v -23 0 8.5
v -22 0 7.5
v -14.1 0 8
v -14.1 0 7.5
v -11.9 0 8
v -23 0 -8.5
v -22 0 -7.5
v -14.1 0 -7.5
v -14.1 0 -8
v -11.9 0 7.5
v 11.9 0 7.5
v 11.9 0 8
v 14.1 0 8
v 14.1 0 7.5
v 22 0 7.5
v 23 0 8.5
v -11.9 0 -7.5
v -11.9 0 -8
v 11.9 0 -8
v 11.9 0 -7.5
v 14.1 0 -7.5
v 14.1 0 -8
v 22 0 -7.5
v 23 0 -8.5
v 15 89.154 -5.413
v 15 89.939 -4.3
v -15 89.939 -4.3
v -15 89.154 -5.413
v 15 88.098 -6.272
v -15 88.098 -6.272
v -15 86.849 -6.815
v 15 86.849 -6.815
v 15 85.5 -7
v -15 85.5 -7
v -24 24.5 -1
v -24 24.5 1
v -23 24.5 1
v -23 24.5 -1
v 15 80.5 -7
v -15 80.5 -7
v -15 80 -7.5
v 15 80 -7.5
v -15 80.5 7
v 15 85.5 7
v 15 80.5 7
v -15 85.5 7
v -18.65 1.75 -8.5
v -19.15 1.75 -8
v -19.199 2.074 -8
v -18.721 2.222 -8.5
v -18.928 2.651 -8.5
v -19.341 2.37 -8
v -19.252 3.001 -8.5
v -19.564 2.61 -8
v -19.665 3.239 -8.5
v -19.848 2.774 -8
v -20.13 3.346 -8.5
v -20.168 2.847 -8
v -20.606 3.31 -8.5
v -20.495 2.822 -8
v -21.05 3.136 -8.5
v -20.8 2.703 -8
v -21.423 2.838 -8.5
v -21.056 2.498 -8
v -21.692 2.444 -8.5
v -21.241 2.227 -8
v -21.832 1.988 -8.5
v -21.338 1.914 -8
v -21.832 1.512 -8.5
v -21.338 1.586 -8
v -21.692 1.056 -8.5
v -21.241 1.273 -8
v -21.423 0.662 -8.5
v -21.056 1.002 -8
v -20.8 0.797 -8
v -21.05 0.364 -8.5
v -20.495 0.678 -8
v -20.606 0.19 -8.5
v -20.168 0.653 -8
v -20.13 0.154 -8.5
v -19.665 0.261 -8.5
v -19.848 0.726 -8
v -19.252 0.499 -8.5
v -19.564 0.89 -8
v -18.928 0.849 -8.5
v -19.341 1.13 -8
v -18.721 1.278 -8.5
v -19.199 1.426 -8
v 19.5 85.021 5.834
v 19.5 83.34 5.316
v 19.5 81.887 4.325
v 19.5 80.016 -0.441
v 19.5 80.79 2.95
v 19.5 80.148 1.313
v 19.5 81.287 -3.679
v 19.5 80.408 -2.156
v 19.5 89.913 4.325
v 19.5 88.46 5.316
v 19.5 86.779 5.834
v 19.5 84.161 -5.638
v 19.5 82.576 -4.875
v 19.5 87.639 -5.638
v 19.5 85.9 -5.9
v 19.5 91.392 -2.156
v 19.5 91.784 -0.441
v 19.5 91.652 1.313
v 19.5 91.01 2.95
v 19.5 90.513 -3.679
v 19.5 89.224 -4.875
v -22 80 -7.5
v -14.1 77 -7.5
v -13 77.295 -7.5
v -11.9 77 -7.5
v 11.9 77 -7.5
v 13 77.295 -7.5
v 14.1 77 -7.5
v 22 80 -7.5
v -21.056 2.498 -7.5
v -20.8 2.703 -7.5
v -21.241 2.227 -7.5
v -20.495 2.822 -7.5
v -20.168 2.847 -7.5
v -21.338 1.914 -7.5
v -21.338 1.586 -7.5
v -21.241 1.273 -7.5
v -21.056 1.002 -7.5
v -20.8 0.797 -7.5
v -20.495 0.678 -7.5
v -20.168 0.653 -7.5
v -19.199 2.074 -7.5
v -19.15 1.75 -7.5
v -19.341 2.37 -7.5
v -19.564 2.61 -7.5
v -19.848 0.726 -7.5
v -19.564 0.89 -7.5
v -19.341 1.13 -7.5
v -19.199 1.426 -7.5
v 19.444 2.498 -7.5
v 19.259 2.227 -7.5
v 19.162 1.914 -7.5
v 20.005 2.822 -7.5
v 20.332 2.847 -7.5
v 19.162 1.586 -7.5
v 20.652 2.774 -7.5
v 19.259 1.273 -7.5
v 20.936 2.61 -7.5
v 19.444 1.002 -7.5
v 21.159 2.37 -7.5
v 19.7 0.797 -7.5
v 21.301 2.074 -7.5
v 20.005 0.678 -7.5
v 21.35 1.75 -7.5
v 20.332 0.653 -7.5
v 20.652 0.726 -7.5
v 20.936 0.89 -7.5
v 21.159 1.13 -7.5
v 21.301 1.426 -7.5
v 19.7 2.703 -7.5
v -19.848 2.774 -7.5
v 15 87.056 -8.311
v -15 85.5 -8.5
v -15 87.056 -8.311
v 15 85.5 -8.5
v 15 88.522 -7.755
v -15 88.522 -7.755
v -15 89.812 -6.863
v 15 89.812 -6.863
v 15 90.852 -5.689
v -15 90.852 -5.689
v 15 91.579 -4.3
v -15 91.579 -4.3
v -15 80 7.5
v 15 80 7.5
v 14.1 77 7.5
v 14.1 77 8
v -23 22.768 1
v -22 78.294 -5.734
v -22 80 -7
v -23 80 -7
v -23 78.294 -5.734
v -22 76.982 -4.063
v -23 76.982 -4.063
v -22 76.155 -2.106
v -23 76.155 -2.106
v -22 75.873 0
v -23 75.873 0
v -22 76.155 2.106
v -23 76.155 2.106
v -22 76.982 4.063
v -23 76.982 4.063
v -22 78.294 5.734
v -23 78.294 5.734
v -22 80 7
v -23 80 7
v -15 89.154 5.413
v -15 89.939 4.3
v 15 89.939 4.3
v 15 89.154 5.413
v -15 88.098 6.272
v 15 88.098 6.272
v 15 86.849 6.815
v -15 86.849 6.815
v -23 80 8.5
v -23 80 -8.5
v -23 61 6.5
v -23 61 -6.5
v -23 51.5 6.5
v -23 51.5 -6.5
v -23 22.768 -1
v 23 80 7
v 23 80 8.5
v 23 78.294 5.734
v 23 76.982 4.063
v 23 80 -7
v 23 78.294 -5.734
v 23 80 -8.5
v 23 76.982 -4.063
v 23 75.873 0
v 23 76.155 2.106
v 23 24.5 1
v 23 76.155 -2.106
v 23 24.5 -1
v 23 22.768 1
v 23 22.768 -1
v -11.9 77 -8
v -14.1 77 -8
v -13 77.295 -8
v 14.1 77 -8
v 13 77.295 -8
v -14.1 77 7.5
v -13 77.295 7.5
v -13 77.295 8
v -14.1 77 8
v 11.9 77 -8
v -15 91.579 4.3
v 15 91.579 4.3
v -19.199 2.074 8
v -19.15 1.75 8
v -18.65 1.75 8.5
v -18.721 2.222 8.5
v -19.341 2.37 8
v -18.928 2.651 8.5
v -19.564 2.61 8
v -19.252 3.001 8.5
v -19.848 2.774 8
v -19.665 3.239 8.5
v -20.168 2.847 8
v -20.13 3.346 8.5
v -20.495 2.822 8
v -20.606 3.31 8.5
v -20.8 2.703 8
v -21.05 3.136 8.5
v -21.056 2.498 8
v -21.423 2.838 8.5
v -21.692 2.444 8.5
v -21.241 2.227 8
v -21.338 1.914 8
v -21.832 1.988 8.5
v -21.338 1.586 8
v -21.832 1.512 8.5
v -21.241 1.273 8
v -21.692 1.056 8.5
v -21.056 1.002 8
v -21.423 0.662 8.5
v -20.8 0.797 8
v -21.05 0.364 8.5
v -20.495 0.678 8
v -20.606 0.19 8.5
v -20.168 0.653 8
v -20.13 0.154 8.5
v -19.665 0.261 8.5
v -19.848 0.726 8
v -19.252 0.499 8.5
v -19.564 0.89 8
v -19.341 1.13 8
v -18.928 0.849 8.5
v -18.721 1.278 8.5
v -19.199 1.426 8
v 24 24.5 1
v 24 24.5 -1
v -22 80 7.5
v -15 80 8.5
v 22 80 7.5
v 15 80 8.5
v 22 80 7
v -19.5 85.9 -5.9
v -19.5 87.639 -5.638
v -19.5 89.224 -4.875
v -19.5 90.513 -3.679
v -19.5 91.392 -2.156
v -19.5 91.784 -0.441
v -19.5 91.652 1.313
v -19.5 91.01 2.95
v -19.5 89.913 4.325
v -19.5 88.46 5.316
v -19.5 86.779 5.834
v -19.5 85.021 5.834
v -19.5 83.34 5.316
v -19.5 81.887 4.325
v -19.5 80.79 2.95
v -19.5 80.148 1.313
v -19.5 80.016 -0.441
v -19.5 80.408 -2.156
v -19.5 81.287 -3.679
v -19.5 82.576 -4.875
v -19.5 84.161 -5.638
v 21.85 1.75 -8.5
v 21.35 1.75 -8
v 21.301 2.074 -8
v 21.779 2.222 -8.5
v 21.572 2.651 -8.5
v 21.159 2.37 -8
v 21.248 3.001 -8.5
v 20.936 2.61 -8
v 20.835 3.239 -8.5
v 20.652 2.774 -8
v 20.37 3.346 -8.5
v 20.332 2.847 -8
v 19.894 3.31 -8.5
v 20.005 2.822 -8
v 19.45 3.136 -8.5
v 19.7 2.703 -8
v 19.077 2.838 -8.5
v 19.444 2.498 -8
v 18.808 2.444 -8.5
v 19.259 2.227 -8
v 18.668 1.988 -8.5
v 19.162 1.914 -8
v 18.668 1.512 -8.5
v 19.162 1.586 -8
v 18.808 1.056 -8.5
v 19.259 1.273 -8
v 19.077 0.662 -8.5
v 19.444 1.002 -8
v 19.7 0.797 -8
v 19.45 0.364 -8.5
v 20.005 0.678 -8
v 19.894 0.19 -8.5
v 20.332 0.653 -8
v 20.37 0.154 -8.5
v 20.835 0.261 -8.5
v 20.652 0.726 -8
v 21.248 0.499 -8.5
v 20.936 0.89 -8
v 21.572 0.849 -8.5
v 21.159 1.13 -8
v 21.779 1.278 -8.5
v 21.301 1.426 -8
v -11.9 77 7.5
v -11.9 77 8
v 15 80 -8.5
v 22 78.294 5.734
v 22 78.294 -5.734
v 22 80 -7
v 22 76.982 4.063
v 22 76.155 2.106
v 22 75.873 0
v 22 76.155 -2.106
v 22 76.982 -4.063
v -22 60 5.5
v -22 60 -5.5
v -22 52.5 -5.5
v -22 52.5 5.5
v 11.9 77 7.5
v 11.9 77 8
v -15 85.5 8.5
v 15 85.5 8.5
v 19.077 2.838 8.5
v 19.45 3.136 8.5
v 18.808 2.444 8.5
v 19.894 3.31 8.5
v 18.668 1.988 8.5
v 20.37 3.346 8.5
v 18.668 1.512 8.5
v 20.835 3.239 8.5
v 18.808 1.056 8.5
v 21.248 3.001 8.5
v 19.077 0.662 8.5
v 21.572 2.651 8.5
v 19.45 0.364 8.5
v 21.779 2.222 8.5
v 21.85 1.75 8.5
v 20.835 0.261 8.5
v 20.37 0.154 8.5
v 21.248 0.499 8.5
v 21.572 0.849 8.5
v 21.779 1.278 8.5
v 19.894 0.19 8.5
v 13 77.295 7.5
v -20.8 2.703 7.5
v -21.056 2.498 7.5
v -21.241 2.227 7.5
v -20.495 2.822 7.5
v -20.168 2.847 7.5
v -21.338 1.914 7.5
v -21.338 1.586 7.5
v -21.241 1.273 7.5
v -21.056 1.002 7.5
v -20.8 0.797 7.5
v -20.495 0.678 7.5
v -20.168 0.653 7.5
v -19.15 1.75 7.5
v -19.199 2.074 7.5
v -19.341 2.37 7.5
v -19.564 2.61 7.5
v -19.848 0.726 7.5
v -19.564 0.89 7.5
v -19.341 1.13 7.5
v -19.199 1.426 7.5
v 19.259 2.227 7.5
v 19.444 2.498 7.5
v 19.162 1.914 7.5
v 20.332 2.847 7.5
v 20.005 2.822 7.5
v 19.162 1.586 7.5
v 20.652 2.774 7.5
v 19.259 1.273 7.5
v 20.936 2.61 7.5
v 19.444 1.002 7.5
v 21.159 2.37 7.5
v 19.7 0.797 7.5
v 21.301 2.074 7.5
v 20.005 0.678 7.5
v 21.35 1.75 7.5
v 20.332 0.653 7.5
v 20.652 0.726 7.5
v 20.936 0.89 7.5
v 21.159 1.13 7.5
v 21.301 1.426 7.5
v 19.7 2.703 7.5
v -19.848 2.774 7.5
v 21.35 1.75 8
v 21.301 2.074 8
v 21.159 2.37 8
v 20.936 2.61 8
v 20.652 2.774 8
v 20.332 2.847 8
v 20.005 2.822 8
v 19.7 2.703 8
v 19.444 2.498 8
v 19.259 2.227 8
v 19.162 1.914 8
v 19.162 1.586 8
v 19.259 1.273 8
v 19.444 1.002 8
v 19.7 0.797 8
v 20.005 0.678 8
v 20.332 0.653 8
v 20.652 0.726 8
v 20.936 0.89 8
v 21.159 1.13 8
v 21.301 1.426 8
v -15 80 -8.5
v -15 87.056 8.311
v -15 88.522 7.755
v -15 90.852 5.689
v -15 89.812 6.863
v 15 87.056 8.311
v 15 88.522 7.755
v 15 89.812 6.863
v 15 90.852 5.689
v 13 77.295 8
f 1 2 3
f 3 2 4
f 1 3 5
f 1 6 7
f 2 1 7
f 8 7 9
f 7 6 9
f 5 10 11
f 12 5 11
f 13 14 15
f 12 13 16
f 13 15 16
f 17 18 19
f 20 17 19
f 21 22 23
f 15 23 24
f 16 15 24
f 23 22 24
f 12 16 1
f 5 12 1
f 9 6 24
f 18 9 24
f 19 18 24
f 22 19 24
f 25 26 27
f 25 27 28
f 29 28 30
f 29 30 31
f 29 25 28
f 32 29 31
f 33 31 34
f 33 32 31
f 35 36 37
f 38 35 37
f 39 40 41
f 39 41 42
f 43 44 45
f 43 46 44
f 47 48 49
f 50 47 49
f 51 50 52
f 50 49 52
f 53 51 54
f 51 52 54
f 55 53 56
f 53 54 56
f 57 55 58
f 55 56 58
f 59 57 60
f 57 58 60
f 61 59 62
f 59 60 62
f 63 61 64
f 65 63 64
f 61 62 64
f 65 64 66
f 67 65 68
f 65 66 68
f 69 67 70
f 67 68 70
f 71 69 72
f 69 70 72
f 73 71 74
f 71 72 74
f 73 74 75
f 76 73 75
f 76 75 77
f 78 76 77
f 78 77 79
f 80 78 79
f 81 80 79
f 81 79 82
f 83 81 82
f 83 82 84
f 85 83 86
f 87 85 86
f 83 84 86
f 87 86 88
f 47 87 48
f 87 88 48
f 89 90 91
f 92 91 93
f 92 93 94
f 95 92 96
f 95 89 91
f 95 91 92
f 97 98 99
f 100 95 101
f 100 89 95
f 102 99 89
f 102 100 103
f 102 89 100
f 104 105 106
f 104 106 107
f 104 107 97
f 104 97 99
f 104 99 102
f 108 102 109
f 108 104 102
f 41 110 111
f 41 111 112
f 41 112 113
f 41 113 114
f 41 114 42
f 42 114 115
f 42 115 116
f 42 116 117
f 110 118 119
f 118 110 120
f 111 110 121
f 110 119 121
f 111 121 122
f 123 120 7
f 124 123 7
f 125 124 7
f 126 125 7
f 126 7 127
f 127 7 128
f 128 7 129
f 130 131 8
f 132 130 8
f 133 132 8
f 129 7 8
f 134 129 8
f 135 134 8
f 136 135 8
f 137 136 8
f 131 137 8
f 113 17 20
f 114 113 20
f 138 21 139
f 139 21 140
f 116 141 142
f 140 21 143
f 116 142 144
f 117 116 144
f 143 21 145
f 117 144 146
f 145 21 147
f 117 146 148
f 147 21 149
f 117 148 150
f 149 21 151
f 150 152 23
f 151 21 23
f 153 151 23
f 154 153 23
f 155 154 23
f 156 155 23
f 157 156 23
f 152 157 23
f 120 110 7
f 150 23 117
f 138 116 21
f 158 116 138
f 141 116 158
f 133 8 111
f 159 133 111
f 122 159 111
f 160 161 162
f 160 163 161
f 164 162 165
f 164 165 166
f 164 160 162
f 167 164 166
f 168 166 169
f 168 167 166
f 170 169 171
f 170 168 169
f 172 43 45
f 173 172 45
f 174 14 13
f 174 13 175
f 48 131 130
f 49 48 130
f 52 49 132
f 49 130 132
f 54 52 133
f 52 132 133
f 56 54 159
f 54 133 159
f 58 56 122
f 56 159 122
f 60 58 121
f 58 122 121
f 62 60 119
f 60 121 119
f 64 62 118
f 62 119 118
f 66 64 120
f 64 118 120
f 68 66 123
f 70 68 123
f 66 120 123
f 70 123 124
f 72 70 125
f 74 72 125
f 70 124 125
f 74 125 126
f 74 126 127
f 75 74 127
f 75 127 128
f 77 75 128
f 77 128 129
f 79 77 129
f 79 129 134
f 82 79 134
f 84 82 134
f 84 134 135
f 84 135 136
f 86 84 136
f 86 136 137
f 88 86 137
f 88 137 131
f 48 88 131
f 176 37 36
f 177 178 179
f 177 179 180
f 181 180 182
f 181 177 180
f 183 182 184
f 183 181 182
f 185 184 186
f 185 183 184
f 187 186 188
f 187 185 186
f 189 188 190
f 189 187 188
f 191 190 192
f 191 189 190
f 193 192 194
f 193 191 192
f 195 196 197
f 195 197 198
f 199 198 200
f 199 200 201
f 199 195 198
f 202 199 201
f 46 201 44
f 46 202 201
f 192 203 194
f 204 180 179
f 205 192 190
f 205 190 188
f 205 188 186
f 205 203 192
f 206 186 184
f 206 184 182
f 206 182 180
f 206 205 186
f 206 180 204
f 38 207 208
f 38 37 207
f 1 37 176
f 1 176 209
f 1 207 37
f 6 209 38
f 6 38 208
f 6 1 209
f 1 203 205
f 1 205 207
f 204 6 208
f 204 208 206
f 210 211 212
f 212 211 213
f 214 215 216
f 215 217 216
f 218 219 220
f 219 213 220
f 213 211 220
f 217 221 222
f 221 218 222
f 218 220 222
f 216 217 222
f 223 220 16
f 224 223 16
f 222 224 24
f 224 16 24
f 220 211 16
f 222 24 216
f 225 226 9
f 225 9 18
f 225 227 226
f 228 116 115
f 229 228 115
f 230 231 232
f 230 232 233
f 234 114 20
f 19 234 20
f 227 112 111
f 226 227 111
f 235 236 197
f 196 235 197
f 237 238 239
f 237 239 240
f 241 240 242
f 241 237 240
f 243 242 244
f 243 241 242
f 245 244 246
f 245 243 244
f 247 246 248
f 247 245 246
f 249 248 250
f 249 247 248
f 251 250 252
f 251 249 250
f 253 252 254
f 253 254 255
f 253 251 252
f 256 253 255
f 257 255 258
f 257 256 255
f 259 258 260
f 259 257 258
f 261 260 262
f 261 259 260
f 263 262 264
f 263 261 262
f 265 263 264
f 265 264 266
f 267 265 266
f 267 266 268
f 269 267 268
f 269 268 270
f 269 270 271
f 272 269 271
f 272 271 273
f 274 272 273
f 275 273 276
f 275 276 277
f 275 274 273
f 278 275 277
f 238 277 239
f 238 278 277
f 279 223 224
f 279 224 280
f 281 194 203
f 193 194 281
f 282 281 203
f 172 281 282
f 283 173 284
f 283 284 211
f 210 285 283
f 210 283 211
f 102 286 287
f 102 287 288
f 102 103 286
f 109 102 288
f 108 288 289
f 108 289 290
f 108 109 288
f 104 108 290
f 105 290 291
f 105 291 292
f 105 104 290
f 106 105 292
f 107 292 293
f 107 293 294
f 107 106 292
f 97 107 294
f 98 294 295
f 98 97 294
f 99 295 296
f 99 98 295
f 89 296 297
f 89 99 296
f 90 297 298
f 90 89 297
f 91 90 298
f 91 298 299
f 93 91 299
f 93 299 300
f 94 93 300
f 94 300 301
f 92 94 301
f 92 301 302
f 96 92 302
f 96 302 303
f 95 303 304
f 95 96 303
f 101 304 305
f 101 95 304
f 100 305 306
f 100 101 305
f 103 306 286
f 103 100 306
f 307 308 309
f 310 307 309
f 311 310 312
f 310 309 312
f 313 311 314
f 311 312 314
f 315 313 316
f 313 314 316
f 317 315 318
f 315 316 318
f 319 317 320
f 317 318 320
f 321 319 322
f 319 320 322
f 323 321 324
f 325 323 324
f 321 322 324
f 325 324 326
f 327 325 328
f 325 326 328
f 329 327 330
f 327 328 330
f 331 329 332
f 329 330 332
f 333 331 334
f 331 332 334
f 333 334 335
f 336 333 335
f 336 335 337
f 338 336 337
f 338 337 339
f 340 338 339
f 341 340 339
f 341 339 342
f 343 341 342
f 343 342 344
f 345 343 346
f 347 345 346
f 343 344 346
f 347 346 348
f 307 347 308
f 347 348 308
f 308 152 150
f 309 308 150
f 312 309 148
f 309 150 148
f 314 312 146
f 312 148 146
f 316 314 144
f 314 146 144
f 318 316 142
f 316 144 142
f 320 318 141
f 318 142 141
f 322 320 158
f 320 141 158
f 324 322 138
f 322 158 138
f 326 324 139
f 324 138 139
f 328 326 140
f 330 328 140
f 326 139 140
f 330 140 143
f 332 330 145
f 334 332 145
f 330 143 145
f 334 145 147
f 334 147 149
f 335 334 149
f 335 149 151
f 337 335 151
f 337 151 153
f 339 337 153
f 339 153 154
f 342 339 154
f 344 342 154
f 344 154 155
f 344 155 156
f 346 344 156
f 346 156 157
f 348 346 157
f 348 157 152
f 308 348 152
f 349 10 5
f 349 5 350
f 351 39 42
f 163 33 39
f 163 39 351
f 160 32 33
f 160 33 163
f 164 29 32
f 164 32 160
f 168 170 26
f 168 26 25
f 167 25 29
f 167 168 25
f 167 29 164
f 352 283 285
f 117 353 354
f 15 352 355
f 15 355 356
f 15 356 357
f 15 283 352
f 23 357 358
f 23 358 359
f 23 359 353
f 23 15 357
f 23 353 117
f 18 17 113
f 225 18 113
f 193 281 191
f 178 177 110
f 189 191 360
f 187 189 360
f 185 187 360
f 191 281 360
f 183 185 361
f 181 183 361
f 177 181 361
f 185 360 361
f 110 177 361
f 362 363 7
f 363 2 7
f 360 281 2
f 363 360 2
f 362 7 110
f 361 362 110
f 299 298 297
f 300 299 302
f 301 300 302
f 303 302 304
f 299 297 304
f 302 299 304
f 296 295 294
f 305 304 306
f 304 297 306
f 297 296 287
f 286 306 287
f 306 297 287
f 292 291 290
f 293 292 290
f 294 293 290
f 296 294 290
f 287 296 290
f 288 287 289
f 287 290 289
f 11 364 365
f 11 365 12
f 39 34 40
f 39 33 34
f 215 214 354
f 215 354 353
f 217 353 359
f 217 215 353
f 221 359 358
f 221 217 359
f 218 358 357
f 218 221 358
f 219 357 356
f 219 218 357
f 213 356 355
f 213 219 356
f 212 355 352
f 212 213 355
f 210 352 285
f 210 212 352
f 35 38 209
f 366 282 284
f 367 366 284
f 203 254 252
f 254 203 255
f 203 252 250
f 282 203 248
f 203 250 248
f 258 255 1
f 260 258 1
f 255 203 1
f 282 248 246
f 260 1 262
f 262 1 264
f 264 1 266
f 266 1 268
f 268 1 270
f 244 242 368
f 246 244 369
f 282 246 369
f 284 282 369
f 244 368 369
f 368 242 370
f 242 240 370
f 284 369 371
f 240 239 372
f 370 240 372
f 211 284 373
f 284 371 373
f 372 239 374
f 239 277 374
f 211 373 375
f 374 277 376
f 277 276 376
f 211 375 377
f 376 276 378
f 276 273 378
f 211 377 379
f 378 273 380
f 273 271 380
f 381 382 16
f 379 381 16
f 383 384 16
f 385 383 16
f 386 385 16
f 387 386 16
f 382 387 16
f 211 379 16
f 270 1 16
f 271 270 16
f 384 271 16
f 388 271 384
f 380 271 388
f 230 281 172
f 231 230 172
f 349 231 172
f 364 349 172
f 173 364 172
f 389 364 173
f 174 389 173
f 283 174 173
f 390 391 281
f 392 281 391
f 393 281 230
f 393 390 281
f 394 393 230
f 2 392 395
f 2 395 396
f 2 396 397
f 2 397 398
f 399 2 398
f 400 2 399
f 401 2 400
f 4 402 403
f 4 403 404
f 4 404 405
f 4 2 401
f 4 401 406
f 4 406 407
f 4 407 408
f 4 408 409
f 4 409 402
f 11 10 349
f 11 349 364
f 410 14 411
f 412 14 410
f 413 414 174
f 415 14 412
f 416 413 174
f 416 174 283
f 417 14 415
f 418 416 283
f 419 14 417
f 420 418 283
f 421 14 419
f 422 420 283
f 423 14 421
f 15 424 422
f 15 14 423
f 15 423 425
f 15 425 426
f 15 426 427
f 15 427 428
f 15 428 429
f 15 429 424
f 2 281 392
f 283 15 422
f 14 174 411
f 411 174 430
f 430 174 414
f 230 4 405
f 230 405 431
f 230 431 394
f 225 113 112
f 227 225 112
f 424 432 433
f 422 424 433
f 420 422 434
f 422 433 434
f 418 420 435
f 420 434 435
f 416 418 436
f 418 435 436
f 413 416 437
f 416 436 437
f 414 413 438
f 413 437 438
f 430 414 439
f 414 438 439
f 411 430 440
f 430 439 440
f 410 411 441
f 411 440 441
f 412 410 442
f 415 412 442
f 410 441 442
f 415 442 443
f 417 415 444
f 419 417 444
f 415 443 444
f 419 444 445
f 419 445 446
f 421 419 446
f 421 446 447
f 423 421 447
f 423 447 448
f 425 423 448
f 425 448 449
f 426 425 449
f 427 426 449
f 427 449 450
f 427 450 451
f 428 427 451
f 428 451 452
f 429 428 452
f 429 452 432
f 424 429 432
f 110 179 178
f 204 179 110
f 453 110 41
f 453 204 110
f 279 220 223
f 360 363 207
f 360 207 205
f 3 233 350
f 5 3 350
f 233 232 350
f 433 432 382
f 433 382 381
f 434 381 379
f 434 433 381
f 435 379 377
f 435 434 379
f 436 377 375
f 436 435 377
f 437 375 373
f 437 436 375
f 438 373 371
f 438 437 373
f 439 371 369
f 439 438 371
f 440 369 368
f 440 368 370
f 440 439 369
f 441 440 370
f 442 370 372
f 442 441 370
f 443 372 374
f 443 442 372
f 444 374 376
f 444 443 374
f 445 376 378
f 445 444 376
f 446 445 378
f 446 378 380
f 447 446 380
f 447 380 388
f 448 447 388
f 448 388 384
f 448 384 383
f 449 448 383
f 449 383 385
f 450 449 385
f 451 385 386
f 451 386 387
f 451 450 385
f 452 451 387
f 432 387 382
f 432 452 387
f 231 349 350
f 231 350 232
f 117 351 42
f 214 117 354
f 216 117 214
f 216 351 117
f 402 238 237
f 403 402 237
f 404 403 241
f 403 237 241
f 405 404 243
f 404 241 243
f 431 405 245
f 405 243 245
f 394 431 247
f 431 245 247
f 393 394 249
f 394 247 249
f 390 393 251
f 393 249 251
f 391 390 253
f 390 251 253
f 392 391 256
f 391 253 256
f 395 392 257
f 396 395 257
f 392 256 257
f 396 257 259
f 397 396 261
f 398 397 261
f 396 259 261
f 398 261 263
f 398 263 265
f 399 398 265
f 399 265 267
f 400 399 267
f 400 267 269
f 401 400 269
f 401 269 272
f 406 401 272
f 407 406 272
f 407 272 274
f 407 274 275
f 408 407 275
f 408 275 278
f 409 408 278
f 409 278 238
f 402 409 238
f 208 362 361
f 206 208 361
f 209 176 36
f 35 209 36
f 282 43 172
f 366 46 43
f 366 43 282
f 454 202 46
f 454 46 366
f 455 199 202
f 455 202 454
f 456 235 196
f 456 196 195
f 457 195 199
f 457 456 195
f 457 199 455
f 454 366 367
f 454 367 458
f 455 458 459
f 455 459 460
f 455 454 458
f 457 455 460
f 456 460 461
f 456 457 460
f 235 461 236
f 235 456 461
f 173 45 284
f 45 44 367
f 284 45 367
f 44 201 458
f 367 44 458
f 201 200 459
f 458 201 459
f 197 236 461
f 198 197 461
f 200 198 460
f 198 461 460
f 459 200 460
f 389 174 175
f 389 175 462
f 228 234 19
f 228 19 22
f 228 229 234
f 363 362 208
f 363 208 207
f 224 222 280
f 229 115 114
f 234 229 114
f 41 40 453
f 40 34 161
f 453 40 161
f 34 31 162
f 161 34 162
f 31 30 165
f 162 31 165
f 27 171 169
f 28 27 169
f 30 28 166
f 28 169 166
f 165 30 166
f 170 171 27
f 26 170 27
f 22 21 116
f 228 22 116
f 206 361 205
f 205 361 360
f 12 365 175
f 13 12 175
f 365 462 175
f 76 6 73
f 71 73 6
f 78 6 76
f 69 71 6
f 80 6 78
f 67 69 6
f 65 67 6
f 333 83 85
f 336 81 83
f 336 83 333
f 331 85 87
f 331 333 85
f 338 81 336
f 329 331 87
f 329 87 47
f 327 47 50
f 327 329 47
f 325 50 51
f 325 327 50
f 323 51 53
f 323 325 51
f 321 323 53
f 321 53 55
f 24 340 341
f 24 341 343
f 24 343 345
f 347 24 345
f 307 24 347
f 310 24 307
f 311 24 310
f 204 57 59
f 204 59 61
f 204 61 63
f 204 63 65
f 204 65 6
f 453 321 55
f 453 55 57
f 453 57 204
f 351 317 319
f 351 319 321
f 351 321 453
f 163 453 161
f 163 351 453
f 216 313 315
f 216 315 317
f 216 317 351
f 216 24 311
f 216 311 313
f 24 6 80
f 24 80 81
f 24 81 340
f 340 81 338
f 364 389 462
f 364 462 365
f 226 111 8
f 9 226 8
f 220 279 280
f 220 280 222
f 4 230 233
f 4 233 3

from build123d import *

# Parameters (mm, degrees)
SKETCH_1_W          = 46
SKETCH_1_H          = 17
SKETCH_1_W_2        = 44
SKETCH_1_H_2        = 15
EXTRUDE_1_DEPTH     = 80
SKETCH_4_W          = 11
SKETCH_4_H          = 7.5
CUT_EXTRUDE_1_DEPTH = 30
SKETCH_6_R          = 5.9
EXTRUDE_4_DEPTH     = 19.5
EXTRUDE_3_DEPTH     = 15
CUT_EXTRUDE_2_DEPTH = 60
CUT_EXTRUDE_3_DEPTH = 0.5
CHAMFER_1_SIZE      = 1
EXTRUDE_START       = -7.5
EXTRUDE_7_DEPTH     = 2
CHAMFER_2_SIZE      = 0.5
SKETCH_15_R         = 1.1
CUT_EXTRUDE_5_DEPTH = 40
CHAMFER_3_SIZE      = 0.5


with BuildPart() as part:
    # 草图1 → 凸台-拉伸1 (new body)
    with BuildSketch(Plane(origin=(0, 0, 0), x_dir=(1, 0, 0), z_dir=(0, 1, 0))):
        Rectangle(SKETCH_1_W, SKETCH_1_H)
        Rectangle(SKETCH_1_W_2, SKETCH_1_H_2, mode=Mode.SUBTRACT)
    extrude(amount=EXTRUDE_1_DEPTH)

    # 草图4 → 切除-拉伸1 (cut)
    with BuildSketch(Plane.ZY.offset(23)):
        with Locations((0, 56.25)):
            Rectangle(SKETCH_4_W, SKETCH_4_H)
    extrude(amount=-CUT_EXTRUDE_1_DEPTH, mode=Mode.SUBTRACT)

    # 草图3 → 凸台-拉伸3 (add, symmetric)
    with BuildSketch(Plane(origin=(0, 0, 0), x_dir=(0, 0, -1), z_dir=(1, 0, 0))):
        with BuildLine():
            Line((-8.5, 80), (-8.5, 85.5))
            ThreePointArc((-8.5, 85.5), (-7.34801212, 89.194423684), (-4.300379581, 91.579330044))
            Line((-4.300379581, 91.579330044), (-4.300379581, 89.939397907))
            ThreePointArc((-4.300379581, 89.939397907), (-6.272112938, 88.097893579), (-7, 85.5))
            Line((-7, 85.5), (-7, 80))
            Line((-7, 80), (-8.5, 80))
        make_face()
        with BuildLine():
            Line((4.300379581, 91.579330044), (4.300379581, 89.939397907))
            ThreePointArc((4.300379581, 89.939397907), (6.272112938, 88.097893579), (7, 85.5))
            Line((7, 85.5), (7, 80))
            Line((7, 80), (8.5, 80))
            Line((8.5, 80), (8.5, 85.5))
            ThreePointArc((8.5, 85.5), (7.34801212, 89.194423684), (4.300379581, 91.579330044))
        make_face()
    extrude(amount=EXTRUDE_3_DEPTH, both=True)

    # 草图8 → 切除-拉伸2 (cut)
    with BuildSketch(Plane(origin=(23, 0, 0), x_dir=(0, 0, -1), z_dir=(1, 0, 0))):
        with BuildLine():
            Line((-7, 80), (7, 80))
            ThreePointArc((7, 80), (0, 75.872983346), (-7, 80))
        make_face()
    extrude(amount=-CUT_EXTRUDE_2_DEPTH, mode=Mode.SUBTRACT)

    # 草图11 → 切除-拉伸3 (cut)
    with BuildSketch(Plane.XY.offset(-7.5)):
        Polygon((-14.1, 77), (-14.1, 0), (-11.9, 0), (-11.9, 77), (-13, 77.294744112), align=None)
        Polygon((11.9, 77), (11.9, 0), (14.1, 0), (14.1, 77), (13, 77.294744112), align=None)
    cut_extrude_3 = extrude(amount=-CUT_EXTRUDE_3_DEPTH, mode=Mode.SUBTRACT)

    # 镜向1: 切除-拉伸3 across plane
    add(cut_extrude_3.mirror(Plane.XY), mode=Mode.SUBTRACT)

    # 倒角1
    chamfer_1_edges = [part.edges().sort_by_distance(p)[0] for p in [
        (-23, 56.25, 5.5),
        (-23, 60, 0),
        (-23, 56.25, -5.5),
        (-23, 52.5, 0),
    ]]
    chamfer(chamfer_1_edges, length=CHAMFER_1_SIZE - 0.0001)  # a hair under: the kernel refuses the full size

    # 草图13 → 凸台-拉伸7 (add)
    with BuildSketch(Plane.XY.offset(8.5).offset(EXTRUDE_START)):
        Polygon((-23, 22.767949192), (-24, 24.5), (-23, 24.5), align=None)
        Polygon((23, 24.5), (23, 22.767949192), (24, 24.5), align=None)
    extrude(amount=-EXTRUDE_7_DEPTH)

    # 倒角2
    chamfer_2_edges = [part.edges().sort_by_distance(p)[0] for p in [
        (0, 80, 7),
        (0, 80, -7),
    ]]
    chamfer(chamfer_2_edges, length=CHAMFER_2_SIZE - 0.0001)  # a hair under: the kernel refuses the full size

    # 草图15 → 切除-拉伸5 (cut)
    with BuildSketch(Plane.XY.offset(8.5)):
        with Locations((-20.25, 1.75)):
            Circle(SKETCH_15_R)
        with Locations((20.25, 1.75)):
            Circle(SKETCH_15_R)
    extrude(amount=-CUT_EXTRUDE_5_DEPTH, mode=Mode.SUBTRACT)

    # 倒角3
    chamfer_3_edges = [part.edges().sort_by_distance(p)[0] for p in [
        (19.15, 1.75, -8.5),
        (19.15, 1.75, 8.5),
        (-21.35, 1.75, -8.5),
        (-21.35, 1.75, 8.5),
    ]]
    chamfer(chamfer_3_edges, length=CHAMFER_3_SIZE)


with BuildPart() as body_2:
    # 草图6 → 凸台-拉伸4 (new, symmetric)
    with BuildSketch(Plane(origin=(0, 0, 0), x_dir=(0, 0, -1), z_dir=(1, 0, 0))):
        with Locations((0, 85.9)):
            Circle(SKETCH_6_R)
    extrude(amount=EXTRUDE_4_DEPTH, both=True)


solid = Compound([part.part, body_2.part])
